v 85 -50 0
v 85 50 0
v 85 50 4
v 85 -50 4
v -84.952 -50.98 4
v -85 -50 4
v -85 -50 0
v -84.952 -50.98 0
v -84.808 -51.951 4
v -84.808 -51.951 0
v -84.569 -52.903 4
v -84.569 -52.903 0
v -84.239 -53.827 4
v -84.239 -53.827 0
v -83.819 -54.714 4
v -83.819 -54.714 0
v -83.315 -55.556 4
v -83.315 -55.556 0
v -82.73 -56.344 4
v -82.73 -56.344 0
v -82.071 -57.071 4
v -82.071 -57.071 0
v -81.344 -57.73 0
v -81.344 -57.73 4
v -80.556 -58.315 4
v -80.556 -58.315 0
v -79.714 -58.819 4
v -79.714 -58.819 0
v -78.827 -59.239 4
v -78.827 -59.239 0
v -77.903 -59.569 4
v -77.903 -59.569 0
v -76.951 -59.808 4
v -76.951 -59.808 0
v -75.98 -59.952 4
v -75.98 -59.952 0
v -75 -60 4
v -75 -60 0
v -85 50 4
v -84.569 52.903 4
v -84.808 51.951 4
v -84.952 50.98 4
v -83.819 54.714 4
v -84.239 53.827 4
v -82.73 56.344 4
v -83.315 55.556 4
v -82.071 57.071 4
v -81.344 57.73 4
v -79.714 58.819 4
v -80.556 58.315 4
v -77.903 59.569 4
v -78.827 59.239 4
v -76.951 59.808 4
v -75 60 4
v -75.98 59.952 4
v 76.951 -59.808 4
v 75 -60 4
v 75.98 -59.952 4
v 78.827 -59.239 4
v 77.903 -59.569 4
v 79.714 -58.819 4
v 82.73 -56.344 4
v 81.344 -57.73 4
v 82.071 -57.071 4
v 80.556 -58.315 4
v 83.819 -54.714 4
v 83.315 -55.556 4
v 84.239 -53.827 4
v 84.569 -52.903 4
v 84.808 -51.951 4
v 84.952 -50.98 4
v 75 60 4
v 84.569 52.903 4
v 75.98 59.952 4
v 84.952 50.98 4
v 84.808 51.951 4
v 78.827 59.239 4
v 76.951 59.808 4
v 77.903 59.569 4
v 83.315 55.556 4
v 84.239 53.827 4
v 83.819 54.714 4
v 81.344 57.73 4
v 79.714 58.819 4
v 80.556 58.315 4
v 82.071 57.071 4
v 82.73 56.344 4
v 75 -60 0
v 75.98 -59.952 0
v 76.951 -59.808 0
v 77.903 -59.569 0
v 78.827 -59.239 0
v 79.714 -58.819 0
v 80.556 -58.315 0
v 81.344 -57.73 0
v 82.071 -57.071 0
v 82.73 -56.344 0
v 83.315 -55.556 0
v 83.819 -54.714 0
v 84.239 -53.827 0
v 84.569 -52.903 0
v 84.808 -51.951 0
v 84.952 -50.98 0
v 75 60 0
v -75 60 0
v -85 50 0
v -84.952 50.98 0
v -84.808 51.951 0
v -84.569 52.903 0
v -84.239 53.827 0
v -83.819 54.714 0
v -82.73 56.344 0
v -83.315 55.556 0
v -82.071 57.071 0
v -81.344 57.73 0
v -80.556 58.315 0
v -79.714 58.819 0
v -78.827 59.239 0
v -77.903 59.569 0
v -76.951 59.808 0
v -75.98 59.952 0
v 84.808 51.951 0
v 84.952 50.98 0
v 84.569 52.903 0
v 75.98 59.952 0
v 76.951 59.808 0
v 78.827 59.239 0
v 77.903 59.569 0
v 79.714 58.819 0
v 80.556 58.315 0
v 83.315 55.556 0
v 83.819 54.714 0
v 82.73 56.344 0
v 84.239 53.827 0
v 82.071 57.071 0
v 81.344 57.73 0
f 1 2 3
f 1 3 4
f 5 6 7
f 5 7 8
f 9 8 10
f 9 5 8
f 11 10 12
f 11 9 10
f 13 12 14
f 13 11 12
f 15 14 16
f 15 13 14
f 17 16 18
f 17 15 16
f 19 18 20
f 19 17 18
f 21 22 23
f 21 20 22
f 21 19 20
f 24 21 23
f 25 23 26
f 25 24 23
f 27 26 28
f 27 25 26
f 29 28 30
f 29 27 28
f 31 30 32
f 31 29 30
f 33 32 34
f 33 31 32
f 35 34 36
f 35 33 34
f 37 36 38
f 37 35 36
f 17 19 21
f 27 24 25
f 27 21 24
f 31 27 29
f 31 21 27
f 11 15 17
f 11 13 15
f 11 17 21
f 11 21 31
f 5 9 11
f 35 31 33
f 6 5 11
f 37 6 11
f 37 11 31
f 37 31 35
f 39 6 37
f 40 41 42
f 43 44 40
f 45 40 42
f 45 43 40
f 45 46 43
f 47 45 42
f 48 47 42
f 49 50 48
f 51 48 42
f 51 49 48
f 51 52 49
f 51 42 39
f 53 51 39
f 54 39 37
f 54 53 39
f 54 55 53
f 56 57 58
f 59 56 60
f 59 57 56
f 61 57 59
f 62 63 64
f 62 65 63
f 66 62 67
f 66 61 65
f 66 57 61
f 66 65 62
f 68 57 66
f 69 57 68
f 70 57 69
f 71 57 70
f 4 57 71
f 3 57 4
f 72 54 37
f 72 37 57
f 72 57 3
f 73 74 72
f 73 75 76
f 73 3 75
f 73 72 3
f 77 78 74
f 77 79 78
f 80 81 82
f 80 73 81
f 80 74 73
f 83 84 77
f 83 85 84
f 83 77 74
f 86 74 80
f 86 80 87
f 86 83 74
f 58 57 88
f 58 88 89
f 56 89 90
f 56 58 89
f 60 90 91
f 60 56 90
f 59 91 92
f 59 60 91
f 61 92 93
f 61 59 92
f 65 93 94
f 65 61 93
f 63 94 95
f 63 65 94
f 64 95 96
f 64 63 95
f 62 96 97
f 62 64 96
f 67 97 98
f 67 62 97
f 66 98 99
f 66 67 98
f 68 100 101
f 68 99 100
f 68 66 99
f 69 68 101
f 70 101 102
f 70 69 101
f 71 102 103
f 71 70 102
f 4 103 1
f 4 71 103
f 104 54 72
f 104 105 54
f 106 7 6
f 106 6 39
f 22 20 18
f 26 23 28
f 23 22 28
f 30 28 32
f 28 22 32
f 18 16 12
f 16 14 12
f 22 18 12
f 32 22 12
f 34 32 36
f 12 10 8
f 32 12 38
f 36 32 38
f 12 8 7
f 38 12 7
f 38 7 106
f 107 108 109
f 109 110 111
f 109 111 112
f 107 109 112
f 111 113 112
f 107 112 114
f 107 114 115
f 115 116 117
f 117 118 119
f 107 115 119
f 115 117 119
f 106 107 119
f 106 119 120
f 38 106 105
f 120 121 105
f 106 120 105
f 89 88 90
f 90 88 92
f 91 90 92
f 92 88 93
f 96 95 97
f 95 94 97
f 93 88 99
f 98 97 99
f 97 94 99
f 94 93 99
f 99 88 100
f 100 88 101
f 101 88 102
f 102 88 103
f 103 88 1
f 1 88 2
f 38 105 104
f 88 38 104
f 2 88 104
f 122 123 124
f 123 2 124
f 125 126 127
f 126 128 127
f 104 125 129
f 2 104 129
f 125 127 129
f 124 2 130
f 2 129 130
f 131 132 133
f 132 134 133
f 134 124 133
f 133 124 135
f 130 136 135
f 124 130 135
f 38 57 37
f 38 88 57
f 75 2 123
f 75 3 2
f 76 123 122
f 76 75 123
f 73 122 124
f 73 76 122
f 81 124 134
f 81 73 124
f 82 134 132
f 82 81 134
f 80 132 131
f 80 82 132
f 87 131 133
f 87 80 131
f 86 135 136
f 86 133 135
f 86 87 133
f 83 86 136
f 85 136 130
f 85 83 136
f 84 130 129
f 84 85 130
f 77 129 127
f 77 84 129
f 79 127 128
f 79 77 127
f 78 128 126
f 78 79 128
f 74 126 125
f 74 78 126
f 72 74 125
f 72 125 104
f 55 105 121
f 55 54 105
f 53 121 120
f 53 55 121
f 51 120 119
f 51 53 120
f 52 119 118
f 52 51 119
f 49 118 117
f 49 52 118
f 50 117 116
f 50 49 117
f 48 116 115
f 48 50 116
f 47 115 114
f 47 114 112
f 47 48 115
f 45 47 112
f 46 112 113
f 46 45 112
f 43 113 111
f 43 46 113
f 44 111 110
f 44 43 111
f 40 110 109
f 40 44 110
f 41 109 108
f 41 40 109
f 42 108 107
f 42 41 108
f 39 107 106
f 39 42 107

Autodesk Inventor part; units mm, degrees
ref_plane "YZ Plane" through (0, 0, 0) normal (1, 0, 0) x (0, 1, 0)
ref_plane "XZ Plane" through (0, 0, 0) normal (0, 1, 0) x (-1, 0, 0)
ref_plane "XY Plane" through (0, 0, 0) normal (0, 0, 1) x (1, 0, 0)
sketch "Sketch1" plane through (0, 0, 0) normal (0, 0, 1) x (1, 0, 0)
  line L0 (-85, 60) -> (85, 60)
  line L1 (85, 60) -> (85, -60)
  line L2 (85, -60) -> (-85, -60)
  line L3 (-85, -60) -> (-85, 60)
  line L4 (-85, 60) -> (85, -60) construction
  line L5 (85, 60) -> (-85, -60) construction
  line L6 (0, 60) -> (0, -60) construction
  point P0 (0, 0)
  dimension "d0" = 170
  dimension "d1" = 120
extrude "Plate1" add sketch "Sketch1" along normal blind 4
fillet "Corner Round1" radius 10 4 edges at (85, -60, 2) (85, 60, 2) (-85, -60, 2) (-85, 60, 2)
equation "\"d2\" = Thickness"
equation "\"BendRadius\" = Thickness"
equation "\"BendReliefWidth\" = Thickness"
equation "\"BendReliefDepth\" = 0.5 * Thickness"
equation "\"CornerReliefSize\" = 4 * Thickness"
equation "\"MinimumRemnant\" = 2 * Thickness"
equation "\"TransitionRadius\" = BendRadius"
equation "\"JacobiRadiusSize\" = BendRadius"
equation "\"GapSize\" = Thickness"
equation "\"Thickness\" = 4"
properties part number "GBK-RK-0820 ring plate"
